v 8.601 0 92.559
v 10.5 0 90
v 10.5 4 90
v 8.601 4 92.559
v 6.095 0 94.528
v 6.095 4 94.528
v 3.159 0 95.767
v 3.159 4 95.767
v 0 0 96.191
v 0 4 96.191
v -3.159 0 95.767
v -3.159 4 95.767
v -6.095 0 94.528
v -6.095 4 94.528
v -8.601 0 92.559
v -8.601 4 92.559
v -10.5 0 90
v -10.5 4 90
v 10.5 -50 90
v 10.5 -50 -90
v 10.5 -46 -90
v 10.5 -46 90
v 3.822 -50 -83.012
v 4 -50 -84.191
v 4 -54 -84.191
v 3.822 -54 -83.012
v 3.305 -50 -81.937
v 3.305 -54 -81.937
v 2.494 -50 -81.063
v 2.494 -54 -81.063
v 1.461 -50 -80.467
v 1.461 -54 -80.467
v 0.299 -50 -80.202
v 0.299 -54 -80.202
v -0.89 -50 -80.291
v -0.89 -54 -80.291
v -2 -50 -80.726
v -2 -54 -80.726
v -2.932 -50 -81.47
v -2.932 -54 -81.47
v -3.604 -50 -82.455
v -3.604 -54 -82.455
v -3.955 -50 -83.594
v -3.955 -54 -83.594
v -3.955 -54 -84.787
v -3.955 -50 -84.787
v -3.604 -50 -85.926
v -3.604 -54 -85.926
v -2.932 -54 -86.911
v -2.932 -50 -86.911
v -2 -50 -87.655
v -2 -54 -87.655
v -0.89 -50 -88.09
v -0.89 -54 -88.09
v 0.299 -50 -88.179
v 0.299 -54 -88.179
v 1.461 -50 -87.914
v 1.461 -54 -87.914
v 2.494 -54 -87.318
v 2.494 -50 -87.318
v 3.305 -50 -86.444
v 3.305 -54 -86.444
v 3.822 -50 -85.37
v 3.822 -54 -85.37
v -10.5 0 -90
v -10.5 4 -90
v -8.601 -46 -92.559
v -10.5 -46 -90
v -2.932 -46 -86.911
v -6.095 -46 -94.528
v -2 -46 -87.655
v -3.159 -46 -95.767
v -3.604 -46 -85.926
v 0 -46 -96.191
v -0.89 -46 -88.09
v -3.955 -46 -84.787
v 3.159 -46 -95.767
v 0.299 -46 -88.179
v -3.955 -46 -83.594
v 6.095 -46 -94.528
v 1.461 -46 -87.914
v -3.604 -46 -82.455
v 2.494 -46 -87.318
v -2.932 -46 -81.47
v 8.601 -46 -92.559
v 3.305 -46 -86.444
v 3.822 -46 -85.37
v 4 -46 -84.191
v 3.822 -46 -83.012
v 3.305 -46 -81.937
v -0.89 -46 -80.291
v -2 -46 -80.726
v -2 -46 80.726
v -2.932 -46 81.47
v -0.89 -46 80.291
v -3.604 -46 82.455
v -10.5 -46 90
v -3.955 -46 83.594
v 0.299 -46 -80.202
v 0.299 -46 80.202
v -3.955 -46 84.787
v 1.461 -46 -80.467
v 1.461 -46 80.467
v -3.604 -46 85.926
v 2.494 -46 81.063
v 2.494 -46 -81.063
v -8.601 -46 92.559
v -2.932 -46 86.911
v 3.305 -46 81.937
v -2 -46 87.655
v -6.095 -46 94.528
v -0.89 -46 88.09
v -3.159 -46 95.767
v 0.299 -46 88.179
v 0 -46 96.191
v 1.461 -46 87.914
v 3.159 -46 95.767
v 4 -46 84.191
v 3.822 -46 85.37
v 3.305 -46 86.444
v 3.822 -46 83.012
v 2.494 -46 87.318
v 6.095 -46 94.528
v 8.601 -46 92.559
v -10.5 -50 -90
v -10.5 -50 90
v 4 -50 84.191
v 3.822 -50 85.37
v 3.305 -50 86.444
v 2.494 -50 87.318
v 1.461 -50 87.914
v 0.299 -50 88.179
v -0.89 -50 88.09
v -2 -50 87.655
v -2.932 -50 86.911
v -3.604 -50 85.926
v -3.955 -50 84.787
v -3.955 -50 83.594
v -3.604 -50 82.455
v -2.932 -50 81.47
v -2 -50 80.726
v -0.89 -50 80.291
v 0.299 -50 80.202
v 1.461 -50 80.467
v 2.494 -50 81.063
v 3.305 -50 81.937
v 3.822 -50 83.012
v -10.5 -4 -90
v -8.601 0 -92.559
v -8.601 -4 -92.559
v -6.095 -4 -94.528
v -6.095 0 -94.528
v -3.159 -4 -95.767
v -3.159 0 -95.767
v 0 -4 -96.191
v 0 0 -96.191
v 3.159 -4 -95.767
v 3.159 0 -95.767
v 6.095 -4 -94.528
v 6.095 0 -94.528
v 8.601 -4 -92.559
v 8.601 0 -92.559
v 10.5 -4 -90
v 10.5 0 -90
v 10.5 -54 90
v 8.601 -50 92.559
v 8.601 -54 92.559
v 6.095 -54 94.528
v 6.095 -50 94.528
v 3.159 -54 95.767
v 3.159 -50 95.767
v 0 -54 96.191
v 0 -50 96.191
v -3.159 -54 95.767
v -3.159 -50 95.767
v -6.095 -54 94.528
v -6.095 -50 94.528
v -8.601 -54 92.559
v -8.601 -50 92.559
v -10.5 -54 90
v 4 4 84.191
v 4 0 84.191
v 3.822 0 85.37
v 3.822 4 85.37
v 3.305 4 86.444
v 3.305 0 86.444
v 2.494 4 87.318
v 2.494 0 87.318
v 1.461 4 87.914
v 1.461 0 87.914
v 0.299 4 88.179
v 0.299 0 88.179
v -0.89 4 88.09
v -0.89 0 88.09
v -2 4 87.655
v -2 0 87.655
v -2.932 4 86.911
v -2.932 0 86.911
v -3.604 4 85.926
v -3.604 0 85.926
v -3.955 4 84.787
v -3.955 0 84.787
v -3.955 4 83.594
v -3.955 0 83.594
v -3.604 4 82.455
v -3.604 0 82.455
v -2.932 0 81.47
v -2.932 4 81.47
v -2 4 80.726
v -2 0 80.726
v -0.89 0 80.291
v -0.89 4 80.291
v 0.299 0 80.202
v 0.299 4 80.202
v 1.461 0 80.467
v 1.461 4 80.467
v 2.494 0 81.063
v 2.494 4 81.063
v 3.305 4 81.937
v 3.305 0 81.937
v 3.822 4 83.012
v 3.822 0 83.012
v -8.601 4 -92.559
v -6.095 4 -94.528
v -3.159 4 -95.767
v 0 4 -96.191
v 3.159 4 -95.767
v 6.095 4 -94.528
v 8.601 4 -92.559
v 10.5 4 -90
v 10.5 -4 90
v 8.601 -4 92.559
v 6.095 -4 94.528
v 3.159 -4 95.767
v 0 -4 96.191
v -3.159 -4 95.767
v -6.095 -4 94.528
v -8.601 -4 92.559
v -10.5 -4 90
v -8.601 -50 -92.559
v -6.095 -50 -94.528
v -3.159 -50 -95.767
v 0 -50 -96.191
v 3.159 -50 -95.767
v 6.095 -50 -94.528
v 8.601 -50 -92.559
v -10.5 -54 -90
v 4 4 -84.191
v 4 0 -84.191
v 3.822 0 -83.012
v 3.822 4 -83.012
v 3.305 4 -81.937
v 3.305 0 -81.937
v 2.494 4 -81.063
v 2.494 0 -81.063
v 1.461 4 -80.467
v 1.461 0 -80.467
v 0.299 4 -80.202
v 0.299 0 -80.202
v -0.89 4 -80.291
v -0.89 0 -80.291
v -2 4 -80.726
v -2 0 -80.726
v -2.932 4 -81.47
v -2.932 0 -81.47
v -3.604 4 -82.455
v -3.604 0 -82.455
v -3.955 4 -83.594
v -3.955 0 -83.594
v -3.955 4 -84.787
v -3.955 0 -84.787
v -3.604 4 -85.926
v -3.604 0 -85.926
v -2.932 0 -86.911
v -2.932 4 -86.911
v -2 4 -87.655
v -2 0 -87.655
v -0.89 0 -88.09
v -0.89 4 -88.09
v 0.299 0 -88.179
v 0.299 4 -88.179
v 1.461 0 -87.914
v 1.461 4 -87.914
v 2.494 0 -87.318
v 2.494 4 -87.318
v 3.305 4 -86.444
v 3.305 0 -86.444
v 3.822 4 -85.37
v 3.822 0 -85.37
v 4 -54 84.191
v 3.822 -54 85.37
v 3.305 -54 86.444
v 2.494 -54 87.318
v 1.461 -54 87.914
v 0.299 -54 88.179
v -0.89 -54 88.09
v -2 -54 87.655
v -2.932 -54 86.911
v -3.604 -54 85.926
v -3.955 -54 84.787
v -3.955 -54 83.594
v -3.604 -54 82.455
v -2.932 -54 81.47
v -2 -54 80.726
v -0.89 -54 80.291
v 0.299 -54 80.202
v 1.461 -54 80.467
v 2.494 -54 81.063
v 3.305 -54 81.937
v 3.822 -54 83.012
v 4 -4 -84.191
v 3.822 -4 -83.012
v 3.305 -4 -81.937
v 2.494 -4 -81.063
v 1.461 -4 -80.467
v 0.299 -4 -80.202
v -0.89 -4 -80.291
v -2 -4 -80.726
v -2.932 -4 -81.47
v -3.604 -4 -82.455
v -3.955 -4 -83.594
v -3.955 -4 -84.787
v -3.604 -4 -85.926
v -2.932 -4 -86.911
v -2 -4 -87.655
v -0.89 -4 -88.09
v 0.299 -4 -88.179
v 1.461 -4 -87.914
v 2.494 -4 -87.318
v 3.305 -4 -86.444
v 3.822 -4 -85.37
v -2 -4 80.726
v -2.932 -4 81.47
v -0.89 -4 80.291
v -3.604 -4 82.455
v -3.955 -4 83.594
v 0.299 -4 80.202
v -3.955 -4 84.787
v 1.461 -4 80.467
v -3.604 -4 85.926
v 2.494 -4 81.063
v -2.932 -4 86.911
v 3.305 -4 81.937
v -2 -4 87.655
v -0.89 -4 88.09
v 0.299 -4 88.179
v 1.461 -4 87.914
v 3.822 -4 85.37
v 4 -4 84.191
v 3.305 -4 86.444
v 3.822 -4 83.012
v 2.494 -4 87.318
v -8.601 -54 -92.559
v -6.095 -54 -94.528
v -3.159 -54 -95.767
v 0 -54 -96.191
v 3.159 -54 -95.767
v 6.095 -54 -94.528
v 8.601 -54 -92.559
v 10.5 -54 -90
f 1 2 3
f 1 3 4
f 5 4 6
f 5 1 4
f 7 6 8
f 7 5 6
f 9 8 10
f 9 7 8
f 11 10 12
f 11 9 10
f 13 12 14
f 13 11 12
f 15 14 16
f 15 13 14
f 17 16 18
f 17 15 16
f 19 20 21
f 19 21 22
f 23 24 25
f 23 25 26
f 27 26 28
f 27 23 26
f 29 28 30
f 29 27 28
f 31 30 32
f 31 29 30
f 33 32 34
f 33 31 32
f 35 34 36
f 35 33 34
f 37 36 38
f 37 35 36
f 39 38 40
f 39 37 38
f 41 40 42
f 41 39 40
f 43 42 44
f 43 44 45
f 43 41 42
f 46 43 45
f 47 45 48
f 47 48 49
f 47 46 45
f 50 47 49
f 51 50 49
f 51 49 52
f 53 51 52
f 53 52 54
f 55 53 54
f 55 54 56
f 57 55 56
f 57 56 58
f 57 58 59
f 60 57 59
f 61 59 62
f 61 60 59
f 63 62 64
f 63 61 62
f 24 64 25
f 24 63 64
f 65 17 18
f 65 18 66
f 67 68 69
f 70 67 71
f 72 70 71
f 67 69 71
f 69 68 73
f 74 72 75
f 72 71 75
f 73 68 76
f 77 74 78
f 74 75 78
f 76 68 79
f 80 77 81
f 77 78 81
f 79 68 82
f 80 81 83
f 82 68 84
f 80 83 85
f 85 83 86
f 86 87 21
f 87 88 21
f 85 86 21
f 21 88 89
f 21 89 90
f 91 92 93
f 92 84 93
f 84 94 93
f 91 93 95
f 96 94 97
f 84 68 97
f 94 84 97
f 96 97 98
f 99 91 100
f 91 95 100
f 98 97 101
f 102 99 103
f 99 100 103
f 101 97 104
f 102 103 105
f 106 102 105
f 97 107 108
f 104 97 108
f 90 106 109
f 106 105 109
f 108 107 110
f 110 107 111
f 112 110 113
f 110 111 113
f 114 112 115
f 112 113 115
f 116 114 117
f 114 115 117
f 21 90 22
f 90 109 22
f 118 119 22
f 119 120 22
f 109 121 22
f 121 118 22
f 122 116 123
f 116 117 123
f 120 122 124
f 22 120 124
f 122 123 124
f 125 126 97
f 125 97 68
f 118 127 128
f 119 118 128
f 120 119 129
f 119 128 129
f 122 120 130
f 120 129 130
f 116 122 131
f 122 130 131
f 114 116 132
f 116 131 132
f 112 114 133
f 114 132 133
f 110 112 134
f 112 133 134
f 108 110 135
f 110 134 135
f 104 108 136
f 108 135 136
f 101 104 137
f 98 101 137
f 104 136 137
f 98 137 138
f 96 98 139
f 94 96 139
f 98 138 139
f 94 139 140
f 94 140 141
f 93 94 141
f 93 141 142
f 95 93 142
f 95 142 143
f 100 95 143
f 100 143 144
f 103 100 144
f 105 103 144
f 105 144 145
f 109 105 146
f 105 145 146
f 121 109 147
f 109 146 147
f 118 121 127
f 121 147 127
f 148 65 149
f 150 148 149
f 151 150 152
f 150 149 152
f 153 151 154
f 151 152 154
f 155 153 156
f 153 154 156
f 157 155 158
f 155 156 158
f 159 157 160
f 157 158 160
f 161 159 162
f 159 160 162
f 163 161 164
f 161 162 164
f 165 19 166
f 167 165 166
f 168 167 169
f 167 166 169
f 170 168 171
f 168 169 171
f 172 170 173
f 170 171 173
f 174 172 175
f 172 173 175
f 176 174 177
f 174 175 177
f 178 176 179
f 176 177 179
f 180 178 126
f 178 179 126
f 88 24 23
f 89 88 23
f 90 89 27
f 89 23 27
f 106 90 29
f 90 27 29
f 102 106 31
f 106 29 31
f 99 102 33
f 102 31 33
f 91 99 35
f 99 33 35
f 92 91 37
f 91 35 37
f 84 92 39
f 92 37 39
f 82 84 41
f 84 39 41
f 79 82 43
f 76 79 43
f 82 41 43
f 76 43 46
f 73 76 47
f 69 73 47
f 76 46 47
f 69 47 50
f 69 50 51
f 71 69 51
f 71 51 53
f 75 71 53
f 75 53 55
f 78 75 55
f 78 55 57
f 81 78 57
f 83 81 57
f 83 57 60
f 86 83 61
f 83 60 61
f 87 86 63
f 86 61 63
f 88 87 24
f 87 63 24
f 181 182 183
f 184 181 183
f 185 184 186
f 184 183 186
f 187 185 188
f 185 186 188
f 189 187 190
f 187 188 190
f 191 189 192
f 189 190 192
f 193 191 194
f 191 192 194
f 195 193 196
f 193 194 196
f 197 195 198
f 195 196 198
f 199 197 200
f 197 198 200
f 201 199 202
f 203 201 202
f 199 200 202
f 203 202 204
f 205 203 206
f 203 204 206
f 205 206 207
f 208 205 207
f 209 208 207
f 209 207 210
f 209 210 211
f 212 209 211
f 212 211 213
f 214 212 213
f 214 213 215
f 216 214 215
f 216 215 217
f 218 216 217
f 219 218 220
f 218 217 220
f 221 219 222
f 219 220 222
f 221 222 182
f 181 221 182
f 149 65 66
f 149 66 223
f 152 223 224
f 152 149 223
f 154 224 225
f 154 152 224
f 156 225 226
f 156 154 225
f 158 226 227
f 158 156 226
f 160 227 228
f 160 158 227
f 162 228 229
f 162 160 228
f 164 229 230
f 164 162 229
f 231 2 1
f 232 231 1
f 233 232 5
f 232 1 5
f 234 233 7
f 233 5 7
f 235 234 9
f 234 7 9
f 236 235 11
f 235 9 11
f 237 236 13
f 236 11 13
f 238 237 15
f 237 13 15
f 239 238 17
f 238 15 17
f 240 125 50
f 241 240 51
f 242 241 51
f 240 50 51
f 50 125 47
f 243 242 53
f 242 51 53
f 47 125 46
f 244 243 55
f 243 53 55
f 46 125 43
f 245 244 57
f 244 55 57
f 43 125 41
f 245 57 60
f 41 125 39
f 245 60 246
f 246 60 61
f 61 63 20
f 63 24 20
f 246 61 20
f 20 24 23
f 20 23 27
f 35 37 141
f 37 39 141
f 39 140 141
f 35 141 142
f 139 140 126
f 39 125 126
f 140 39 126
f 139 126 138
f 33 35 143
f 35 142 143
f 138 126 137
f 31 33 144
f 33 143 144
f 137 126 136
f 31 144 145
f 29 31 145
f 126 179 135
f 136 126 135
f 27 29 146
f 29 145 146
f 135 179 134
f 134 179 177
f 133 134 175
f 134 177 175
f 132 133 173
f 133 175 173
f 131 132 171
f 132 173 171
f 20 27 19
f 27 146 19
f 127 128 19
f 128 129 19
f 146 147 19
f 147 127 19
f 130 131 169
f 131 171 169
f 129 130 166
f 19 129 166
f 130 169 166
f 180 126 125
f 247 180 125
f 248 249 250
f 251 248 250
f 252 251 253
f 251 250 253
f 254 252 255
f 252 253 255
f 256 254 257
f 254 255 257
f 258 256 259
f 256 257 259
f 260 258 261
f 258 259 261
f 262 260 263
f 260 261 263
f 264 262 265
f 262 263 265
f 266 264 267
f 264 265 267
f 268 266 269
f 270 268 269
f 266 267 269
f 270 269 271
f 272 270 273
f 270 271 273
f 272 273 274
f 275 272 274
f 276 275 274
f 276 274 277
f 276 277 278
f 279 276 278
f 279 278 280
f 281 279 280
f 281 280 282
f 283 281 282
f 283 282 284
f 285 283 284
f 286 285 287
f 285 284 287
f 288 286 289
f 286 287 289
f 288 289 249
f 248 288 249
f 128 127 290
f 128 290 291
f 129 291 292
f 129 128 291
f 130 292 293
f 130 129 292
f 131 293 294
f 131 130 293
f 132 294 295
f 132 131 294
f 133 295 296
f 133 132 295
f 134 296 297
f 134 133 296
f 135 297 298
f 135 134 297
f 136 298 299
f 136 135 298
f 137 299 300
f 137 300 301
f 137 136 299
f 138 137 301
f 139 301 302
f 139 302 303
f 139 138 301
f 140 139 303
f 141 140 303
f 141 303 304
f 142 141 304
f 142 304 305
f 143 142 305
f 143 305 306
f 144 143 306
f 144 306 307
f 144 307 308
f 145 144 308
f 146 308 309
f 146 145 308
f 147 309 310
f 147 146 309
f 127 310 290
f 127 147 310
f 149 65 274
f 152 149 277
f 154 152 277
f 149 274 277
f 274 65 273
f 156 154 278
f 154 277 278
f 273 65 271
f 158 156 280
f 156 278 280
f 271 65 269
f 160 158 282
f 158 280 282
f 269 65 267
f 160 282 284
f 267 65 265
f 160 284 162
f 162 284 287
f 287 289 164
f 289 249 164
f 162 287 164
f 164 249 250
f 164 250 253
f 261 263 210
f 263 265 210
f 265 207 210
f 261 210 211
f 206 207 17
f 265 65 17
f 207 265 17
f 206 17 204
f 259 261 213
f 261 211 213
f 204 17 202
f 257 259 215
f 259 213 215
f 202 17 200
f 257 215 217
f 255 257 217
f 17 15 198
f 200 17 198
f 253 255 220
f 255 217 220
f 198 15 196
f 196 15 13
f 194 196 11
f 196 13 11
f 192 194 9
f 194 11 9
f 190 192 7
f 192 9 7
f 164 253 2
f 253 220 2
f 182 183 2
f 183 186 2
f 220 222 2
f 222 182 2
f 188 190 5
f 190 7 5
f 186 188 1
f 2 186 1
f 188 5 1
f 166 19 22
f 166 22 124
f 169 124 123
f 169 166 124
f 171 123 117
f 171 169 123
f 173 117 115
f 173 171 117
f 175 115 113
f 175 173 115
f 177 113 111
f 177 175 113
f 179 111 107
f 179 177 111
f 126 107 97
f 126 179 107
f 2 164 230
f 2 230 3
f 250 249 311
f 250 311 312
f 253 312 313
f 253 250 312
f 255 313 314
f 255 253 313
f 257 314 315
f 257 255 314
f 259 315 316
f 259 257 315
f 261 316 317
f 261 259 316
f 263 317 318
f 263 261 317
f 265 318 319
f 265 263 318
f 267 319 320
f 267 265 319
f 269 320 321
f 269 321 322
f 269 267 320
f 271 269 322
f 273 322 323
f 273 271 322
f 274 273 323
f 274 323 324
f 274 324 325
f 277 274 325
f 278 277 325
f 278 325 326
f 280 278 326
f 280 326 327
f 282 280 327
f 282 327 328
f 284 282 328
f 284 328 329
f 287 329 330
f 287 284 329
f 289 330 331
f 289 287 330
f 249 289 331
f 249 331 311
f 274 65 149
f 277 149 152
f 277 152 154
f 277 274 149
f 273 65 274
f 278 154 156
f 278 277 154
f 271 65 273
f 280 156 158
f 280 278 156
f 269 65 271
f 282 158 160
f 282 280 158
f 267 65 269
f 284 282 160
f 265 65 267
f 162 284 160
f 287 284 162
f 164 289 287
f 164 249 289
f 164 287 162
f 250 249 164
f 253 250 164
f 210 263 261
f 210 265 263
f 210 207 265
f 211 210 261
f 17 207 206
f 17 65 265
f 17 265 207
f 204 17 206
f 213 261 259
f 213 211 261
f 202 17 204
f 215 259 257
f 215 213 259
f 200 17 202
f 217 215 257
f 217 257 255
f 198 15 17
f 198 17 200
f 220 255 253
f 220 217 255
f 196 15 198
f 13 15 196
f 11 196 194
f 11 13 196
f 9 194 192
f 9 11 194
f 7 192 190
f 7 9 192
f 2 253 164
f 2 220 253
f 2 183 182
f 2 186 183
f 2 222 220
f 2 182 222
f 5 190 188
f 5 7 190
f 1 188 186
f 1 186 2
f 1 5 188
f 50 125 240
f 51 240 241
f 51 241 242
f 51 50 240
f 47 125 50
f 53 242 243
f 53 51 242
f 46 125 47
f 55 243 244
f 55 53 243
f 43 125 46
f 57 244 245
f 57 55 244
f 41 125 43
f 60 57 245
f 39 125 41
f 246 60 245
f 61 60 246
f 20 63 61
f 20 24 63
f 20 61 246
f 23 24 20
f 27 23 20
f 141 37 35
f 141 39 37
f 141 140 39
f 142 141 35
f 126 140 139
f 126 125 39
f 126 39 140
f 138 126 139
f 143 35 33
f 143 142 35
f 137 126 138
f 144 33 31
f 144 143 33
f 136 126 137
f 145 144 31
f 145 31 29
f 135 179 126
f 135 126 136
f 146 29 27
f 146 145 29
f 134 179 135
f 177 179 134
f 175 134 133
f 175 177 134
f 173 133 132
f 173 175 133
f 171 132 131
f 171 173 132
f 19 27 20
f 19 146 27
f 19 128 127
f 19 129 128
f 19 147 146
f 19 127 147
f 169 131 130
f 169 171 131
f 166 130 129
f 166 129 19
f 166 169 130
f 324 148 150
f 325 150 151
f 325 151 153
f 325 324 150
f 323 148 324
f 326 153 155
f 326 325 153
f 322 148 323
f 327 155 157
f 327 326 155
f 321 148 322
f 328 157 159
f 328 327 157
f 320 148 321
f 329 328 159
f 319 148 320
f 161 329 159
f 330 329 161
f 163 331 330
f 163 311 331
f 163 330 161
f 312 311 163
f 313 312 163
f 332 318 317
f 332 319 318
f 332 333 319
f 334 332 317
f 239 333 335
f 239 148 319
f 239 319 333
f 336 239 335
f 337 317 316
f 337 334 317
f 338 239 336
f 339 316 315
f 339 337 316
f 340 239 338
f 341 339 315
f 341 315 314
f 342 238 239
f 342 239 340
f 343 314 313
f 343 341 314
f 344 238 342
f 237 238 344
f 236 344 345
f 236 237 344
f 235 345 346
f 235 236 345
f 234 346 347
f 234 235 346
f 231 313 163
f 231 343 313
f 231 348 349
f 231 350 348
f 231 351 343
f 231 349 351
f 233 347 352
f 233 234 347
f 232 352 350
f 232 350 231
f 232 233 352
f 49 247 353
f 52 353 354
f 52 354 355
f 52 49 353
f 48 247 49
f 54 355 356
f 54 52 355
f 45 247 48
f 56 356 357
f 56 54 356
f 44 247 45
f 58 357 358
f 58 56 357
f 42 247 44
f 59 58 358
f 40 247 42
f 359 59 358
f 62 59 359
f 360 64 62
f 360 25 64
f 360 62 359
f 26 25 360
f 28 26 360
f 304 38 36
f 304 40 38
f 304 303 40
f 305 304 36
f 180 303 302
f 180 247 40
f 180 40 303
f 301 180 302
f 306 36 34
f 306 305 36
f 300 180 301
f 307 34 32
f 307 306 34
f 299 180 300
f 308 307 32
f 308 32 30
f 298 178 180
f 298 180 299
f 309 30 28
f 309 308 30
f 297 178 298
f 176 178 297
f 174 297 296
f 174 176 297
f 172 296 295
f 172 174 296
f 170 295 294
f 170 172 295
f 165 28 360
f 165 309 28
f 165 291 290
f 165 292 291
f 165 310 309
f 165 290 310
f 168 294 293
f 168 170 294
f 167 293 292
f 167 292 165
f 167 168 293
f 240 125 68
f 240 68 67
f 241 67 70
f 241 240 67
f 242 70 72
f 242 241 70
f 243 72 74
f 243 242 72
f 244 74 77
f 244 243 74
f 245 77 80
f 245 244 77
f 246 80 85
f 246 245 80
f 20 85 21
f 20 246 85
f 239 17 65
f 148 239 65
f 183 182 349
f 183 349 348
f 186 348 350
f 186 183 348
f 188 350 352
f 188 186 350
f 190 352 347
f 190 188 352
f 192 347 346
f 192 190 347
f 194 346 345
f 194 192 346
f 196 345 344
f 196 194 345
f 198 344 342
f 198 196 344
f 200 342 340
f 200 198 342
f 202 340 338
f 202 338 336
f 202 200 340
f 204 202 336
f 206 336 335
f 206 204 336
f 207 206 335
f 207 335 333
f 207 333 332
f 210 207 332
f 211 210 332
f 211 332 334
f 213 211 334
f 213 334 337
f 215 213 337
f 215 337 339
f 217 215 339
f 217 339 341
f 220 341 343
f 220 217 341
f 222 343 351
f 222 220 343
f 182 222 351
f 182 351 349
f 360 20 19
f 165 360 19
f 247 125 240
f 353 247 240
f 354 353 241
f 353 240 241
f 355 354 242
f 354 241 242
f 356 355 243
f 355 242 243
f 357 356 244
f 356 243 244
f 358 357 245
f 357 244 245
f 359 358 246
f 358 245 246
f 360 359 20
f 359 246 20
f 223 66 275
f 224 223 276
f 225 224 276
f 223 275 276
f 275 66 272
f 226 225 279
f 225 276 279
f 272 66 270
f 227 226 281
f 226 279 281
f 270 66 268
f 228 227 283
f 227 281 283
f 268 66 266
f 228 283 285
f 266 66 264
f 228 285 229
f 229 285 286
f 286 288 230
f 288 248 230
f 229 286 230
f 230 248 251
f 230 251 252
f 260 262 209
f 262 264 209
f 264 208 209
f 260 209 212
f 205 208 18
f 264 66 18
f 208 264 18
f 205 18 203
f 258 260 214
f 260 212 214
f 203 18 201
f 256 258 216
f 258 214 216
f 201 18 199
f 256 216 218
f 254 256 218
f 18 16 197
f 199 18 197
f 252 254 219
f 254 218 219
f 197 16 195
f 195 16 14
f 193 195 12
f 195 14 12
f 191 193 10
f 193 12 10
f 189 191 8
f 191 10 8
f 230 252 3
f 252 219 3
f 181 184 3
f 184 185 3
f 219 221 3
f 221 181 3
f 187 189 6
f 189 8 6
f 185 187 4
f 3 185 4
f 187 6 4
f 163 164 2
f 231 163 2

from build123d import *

# Parameters (mm, degrees)
F0_R     = 4
F1_DEPTH = 4


with BuildPart() as f1:
    # F0 (on Front) → F1 (new body)
    with BuildSketch(Plane.XZ):
        with BuildLine():
            ThreePointArc((10.5, 90), (0, 96.190525), (-10.5, 90))
            Line((-10.5, 90), (-10.5, -90))
            ThreePointArc((-10.5, -90), (0, -96.190525), (10.5, -90))
            Line((10.5, -90), (10.5, 90))
        make_face()
        with Locations((0, -84.190525)):
            Circle(F0_R, mode=Mode.SUBTRACT)
        with Locations((0, 84.190525)):
            Circle(F0_R, mode=Mode.SUBTRACT)
    extrude(amount=F1_DEPTH)


with BuildPart() as f2_1:
    # F2: instance of F1
    add(f1.part.mirror(Plane.XZ))


with BuildPart() as f4_1:
    # F4: instance of F2_1
    add(f2_1.part.mirror(Plane.XZ.offset(25)))


with BuildPart() as f4_2:
    # F4: instance of F1
    add(f1.part.mirror(Plane.XZ.offset(25)))


solid = Compound([f1.part, f2_1.part, f4_1.part, f4_2.part])
